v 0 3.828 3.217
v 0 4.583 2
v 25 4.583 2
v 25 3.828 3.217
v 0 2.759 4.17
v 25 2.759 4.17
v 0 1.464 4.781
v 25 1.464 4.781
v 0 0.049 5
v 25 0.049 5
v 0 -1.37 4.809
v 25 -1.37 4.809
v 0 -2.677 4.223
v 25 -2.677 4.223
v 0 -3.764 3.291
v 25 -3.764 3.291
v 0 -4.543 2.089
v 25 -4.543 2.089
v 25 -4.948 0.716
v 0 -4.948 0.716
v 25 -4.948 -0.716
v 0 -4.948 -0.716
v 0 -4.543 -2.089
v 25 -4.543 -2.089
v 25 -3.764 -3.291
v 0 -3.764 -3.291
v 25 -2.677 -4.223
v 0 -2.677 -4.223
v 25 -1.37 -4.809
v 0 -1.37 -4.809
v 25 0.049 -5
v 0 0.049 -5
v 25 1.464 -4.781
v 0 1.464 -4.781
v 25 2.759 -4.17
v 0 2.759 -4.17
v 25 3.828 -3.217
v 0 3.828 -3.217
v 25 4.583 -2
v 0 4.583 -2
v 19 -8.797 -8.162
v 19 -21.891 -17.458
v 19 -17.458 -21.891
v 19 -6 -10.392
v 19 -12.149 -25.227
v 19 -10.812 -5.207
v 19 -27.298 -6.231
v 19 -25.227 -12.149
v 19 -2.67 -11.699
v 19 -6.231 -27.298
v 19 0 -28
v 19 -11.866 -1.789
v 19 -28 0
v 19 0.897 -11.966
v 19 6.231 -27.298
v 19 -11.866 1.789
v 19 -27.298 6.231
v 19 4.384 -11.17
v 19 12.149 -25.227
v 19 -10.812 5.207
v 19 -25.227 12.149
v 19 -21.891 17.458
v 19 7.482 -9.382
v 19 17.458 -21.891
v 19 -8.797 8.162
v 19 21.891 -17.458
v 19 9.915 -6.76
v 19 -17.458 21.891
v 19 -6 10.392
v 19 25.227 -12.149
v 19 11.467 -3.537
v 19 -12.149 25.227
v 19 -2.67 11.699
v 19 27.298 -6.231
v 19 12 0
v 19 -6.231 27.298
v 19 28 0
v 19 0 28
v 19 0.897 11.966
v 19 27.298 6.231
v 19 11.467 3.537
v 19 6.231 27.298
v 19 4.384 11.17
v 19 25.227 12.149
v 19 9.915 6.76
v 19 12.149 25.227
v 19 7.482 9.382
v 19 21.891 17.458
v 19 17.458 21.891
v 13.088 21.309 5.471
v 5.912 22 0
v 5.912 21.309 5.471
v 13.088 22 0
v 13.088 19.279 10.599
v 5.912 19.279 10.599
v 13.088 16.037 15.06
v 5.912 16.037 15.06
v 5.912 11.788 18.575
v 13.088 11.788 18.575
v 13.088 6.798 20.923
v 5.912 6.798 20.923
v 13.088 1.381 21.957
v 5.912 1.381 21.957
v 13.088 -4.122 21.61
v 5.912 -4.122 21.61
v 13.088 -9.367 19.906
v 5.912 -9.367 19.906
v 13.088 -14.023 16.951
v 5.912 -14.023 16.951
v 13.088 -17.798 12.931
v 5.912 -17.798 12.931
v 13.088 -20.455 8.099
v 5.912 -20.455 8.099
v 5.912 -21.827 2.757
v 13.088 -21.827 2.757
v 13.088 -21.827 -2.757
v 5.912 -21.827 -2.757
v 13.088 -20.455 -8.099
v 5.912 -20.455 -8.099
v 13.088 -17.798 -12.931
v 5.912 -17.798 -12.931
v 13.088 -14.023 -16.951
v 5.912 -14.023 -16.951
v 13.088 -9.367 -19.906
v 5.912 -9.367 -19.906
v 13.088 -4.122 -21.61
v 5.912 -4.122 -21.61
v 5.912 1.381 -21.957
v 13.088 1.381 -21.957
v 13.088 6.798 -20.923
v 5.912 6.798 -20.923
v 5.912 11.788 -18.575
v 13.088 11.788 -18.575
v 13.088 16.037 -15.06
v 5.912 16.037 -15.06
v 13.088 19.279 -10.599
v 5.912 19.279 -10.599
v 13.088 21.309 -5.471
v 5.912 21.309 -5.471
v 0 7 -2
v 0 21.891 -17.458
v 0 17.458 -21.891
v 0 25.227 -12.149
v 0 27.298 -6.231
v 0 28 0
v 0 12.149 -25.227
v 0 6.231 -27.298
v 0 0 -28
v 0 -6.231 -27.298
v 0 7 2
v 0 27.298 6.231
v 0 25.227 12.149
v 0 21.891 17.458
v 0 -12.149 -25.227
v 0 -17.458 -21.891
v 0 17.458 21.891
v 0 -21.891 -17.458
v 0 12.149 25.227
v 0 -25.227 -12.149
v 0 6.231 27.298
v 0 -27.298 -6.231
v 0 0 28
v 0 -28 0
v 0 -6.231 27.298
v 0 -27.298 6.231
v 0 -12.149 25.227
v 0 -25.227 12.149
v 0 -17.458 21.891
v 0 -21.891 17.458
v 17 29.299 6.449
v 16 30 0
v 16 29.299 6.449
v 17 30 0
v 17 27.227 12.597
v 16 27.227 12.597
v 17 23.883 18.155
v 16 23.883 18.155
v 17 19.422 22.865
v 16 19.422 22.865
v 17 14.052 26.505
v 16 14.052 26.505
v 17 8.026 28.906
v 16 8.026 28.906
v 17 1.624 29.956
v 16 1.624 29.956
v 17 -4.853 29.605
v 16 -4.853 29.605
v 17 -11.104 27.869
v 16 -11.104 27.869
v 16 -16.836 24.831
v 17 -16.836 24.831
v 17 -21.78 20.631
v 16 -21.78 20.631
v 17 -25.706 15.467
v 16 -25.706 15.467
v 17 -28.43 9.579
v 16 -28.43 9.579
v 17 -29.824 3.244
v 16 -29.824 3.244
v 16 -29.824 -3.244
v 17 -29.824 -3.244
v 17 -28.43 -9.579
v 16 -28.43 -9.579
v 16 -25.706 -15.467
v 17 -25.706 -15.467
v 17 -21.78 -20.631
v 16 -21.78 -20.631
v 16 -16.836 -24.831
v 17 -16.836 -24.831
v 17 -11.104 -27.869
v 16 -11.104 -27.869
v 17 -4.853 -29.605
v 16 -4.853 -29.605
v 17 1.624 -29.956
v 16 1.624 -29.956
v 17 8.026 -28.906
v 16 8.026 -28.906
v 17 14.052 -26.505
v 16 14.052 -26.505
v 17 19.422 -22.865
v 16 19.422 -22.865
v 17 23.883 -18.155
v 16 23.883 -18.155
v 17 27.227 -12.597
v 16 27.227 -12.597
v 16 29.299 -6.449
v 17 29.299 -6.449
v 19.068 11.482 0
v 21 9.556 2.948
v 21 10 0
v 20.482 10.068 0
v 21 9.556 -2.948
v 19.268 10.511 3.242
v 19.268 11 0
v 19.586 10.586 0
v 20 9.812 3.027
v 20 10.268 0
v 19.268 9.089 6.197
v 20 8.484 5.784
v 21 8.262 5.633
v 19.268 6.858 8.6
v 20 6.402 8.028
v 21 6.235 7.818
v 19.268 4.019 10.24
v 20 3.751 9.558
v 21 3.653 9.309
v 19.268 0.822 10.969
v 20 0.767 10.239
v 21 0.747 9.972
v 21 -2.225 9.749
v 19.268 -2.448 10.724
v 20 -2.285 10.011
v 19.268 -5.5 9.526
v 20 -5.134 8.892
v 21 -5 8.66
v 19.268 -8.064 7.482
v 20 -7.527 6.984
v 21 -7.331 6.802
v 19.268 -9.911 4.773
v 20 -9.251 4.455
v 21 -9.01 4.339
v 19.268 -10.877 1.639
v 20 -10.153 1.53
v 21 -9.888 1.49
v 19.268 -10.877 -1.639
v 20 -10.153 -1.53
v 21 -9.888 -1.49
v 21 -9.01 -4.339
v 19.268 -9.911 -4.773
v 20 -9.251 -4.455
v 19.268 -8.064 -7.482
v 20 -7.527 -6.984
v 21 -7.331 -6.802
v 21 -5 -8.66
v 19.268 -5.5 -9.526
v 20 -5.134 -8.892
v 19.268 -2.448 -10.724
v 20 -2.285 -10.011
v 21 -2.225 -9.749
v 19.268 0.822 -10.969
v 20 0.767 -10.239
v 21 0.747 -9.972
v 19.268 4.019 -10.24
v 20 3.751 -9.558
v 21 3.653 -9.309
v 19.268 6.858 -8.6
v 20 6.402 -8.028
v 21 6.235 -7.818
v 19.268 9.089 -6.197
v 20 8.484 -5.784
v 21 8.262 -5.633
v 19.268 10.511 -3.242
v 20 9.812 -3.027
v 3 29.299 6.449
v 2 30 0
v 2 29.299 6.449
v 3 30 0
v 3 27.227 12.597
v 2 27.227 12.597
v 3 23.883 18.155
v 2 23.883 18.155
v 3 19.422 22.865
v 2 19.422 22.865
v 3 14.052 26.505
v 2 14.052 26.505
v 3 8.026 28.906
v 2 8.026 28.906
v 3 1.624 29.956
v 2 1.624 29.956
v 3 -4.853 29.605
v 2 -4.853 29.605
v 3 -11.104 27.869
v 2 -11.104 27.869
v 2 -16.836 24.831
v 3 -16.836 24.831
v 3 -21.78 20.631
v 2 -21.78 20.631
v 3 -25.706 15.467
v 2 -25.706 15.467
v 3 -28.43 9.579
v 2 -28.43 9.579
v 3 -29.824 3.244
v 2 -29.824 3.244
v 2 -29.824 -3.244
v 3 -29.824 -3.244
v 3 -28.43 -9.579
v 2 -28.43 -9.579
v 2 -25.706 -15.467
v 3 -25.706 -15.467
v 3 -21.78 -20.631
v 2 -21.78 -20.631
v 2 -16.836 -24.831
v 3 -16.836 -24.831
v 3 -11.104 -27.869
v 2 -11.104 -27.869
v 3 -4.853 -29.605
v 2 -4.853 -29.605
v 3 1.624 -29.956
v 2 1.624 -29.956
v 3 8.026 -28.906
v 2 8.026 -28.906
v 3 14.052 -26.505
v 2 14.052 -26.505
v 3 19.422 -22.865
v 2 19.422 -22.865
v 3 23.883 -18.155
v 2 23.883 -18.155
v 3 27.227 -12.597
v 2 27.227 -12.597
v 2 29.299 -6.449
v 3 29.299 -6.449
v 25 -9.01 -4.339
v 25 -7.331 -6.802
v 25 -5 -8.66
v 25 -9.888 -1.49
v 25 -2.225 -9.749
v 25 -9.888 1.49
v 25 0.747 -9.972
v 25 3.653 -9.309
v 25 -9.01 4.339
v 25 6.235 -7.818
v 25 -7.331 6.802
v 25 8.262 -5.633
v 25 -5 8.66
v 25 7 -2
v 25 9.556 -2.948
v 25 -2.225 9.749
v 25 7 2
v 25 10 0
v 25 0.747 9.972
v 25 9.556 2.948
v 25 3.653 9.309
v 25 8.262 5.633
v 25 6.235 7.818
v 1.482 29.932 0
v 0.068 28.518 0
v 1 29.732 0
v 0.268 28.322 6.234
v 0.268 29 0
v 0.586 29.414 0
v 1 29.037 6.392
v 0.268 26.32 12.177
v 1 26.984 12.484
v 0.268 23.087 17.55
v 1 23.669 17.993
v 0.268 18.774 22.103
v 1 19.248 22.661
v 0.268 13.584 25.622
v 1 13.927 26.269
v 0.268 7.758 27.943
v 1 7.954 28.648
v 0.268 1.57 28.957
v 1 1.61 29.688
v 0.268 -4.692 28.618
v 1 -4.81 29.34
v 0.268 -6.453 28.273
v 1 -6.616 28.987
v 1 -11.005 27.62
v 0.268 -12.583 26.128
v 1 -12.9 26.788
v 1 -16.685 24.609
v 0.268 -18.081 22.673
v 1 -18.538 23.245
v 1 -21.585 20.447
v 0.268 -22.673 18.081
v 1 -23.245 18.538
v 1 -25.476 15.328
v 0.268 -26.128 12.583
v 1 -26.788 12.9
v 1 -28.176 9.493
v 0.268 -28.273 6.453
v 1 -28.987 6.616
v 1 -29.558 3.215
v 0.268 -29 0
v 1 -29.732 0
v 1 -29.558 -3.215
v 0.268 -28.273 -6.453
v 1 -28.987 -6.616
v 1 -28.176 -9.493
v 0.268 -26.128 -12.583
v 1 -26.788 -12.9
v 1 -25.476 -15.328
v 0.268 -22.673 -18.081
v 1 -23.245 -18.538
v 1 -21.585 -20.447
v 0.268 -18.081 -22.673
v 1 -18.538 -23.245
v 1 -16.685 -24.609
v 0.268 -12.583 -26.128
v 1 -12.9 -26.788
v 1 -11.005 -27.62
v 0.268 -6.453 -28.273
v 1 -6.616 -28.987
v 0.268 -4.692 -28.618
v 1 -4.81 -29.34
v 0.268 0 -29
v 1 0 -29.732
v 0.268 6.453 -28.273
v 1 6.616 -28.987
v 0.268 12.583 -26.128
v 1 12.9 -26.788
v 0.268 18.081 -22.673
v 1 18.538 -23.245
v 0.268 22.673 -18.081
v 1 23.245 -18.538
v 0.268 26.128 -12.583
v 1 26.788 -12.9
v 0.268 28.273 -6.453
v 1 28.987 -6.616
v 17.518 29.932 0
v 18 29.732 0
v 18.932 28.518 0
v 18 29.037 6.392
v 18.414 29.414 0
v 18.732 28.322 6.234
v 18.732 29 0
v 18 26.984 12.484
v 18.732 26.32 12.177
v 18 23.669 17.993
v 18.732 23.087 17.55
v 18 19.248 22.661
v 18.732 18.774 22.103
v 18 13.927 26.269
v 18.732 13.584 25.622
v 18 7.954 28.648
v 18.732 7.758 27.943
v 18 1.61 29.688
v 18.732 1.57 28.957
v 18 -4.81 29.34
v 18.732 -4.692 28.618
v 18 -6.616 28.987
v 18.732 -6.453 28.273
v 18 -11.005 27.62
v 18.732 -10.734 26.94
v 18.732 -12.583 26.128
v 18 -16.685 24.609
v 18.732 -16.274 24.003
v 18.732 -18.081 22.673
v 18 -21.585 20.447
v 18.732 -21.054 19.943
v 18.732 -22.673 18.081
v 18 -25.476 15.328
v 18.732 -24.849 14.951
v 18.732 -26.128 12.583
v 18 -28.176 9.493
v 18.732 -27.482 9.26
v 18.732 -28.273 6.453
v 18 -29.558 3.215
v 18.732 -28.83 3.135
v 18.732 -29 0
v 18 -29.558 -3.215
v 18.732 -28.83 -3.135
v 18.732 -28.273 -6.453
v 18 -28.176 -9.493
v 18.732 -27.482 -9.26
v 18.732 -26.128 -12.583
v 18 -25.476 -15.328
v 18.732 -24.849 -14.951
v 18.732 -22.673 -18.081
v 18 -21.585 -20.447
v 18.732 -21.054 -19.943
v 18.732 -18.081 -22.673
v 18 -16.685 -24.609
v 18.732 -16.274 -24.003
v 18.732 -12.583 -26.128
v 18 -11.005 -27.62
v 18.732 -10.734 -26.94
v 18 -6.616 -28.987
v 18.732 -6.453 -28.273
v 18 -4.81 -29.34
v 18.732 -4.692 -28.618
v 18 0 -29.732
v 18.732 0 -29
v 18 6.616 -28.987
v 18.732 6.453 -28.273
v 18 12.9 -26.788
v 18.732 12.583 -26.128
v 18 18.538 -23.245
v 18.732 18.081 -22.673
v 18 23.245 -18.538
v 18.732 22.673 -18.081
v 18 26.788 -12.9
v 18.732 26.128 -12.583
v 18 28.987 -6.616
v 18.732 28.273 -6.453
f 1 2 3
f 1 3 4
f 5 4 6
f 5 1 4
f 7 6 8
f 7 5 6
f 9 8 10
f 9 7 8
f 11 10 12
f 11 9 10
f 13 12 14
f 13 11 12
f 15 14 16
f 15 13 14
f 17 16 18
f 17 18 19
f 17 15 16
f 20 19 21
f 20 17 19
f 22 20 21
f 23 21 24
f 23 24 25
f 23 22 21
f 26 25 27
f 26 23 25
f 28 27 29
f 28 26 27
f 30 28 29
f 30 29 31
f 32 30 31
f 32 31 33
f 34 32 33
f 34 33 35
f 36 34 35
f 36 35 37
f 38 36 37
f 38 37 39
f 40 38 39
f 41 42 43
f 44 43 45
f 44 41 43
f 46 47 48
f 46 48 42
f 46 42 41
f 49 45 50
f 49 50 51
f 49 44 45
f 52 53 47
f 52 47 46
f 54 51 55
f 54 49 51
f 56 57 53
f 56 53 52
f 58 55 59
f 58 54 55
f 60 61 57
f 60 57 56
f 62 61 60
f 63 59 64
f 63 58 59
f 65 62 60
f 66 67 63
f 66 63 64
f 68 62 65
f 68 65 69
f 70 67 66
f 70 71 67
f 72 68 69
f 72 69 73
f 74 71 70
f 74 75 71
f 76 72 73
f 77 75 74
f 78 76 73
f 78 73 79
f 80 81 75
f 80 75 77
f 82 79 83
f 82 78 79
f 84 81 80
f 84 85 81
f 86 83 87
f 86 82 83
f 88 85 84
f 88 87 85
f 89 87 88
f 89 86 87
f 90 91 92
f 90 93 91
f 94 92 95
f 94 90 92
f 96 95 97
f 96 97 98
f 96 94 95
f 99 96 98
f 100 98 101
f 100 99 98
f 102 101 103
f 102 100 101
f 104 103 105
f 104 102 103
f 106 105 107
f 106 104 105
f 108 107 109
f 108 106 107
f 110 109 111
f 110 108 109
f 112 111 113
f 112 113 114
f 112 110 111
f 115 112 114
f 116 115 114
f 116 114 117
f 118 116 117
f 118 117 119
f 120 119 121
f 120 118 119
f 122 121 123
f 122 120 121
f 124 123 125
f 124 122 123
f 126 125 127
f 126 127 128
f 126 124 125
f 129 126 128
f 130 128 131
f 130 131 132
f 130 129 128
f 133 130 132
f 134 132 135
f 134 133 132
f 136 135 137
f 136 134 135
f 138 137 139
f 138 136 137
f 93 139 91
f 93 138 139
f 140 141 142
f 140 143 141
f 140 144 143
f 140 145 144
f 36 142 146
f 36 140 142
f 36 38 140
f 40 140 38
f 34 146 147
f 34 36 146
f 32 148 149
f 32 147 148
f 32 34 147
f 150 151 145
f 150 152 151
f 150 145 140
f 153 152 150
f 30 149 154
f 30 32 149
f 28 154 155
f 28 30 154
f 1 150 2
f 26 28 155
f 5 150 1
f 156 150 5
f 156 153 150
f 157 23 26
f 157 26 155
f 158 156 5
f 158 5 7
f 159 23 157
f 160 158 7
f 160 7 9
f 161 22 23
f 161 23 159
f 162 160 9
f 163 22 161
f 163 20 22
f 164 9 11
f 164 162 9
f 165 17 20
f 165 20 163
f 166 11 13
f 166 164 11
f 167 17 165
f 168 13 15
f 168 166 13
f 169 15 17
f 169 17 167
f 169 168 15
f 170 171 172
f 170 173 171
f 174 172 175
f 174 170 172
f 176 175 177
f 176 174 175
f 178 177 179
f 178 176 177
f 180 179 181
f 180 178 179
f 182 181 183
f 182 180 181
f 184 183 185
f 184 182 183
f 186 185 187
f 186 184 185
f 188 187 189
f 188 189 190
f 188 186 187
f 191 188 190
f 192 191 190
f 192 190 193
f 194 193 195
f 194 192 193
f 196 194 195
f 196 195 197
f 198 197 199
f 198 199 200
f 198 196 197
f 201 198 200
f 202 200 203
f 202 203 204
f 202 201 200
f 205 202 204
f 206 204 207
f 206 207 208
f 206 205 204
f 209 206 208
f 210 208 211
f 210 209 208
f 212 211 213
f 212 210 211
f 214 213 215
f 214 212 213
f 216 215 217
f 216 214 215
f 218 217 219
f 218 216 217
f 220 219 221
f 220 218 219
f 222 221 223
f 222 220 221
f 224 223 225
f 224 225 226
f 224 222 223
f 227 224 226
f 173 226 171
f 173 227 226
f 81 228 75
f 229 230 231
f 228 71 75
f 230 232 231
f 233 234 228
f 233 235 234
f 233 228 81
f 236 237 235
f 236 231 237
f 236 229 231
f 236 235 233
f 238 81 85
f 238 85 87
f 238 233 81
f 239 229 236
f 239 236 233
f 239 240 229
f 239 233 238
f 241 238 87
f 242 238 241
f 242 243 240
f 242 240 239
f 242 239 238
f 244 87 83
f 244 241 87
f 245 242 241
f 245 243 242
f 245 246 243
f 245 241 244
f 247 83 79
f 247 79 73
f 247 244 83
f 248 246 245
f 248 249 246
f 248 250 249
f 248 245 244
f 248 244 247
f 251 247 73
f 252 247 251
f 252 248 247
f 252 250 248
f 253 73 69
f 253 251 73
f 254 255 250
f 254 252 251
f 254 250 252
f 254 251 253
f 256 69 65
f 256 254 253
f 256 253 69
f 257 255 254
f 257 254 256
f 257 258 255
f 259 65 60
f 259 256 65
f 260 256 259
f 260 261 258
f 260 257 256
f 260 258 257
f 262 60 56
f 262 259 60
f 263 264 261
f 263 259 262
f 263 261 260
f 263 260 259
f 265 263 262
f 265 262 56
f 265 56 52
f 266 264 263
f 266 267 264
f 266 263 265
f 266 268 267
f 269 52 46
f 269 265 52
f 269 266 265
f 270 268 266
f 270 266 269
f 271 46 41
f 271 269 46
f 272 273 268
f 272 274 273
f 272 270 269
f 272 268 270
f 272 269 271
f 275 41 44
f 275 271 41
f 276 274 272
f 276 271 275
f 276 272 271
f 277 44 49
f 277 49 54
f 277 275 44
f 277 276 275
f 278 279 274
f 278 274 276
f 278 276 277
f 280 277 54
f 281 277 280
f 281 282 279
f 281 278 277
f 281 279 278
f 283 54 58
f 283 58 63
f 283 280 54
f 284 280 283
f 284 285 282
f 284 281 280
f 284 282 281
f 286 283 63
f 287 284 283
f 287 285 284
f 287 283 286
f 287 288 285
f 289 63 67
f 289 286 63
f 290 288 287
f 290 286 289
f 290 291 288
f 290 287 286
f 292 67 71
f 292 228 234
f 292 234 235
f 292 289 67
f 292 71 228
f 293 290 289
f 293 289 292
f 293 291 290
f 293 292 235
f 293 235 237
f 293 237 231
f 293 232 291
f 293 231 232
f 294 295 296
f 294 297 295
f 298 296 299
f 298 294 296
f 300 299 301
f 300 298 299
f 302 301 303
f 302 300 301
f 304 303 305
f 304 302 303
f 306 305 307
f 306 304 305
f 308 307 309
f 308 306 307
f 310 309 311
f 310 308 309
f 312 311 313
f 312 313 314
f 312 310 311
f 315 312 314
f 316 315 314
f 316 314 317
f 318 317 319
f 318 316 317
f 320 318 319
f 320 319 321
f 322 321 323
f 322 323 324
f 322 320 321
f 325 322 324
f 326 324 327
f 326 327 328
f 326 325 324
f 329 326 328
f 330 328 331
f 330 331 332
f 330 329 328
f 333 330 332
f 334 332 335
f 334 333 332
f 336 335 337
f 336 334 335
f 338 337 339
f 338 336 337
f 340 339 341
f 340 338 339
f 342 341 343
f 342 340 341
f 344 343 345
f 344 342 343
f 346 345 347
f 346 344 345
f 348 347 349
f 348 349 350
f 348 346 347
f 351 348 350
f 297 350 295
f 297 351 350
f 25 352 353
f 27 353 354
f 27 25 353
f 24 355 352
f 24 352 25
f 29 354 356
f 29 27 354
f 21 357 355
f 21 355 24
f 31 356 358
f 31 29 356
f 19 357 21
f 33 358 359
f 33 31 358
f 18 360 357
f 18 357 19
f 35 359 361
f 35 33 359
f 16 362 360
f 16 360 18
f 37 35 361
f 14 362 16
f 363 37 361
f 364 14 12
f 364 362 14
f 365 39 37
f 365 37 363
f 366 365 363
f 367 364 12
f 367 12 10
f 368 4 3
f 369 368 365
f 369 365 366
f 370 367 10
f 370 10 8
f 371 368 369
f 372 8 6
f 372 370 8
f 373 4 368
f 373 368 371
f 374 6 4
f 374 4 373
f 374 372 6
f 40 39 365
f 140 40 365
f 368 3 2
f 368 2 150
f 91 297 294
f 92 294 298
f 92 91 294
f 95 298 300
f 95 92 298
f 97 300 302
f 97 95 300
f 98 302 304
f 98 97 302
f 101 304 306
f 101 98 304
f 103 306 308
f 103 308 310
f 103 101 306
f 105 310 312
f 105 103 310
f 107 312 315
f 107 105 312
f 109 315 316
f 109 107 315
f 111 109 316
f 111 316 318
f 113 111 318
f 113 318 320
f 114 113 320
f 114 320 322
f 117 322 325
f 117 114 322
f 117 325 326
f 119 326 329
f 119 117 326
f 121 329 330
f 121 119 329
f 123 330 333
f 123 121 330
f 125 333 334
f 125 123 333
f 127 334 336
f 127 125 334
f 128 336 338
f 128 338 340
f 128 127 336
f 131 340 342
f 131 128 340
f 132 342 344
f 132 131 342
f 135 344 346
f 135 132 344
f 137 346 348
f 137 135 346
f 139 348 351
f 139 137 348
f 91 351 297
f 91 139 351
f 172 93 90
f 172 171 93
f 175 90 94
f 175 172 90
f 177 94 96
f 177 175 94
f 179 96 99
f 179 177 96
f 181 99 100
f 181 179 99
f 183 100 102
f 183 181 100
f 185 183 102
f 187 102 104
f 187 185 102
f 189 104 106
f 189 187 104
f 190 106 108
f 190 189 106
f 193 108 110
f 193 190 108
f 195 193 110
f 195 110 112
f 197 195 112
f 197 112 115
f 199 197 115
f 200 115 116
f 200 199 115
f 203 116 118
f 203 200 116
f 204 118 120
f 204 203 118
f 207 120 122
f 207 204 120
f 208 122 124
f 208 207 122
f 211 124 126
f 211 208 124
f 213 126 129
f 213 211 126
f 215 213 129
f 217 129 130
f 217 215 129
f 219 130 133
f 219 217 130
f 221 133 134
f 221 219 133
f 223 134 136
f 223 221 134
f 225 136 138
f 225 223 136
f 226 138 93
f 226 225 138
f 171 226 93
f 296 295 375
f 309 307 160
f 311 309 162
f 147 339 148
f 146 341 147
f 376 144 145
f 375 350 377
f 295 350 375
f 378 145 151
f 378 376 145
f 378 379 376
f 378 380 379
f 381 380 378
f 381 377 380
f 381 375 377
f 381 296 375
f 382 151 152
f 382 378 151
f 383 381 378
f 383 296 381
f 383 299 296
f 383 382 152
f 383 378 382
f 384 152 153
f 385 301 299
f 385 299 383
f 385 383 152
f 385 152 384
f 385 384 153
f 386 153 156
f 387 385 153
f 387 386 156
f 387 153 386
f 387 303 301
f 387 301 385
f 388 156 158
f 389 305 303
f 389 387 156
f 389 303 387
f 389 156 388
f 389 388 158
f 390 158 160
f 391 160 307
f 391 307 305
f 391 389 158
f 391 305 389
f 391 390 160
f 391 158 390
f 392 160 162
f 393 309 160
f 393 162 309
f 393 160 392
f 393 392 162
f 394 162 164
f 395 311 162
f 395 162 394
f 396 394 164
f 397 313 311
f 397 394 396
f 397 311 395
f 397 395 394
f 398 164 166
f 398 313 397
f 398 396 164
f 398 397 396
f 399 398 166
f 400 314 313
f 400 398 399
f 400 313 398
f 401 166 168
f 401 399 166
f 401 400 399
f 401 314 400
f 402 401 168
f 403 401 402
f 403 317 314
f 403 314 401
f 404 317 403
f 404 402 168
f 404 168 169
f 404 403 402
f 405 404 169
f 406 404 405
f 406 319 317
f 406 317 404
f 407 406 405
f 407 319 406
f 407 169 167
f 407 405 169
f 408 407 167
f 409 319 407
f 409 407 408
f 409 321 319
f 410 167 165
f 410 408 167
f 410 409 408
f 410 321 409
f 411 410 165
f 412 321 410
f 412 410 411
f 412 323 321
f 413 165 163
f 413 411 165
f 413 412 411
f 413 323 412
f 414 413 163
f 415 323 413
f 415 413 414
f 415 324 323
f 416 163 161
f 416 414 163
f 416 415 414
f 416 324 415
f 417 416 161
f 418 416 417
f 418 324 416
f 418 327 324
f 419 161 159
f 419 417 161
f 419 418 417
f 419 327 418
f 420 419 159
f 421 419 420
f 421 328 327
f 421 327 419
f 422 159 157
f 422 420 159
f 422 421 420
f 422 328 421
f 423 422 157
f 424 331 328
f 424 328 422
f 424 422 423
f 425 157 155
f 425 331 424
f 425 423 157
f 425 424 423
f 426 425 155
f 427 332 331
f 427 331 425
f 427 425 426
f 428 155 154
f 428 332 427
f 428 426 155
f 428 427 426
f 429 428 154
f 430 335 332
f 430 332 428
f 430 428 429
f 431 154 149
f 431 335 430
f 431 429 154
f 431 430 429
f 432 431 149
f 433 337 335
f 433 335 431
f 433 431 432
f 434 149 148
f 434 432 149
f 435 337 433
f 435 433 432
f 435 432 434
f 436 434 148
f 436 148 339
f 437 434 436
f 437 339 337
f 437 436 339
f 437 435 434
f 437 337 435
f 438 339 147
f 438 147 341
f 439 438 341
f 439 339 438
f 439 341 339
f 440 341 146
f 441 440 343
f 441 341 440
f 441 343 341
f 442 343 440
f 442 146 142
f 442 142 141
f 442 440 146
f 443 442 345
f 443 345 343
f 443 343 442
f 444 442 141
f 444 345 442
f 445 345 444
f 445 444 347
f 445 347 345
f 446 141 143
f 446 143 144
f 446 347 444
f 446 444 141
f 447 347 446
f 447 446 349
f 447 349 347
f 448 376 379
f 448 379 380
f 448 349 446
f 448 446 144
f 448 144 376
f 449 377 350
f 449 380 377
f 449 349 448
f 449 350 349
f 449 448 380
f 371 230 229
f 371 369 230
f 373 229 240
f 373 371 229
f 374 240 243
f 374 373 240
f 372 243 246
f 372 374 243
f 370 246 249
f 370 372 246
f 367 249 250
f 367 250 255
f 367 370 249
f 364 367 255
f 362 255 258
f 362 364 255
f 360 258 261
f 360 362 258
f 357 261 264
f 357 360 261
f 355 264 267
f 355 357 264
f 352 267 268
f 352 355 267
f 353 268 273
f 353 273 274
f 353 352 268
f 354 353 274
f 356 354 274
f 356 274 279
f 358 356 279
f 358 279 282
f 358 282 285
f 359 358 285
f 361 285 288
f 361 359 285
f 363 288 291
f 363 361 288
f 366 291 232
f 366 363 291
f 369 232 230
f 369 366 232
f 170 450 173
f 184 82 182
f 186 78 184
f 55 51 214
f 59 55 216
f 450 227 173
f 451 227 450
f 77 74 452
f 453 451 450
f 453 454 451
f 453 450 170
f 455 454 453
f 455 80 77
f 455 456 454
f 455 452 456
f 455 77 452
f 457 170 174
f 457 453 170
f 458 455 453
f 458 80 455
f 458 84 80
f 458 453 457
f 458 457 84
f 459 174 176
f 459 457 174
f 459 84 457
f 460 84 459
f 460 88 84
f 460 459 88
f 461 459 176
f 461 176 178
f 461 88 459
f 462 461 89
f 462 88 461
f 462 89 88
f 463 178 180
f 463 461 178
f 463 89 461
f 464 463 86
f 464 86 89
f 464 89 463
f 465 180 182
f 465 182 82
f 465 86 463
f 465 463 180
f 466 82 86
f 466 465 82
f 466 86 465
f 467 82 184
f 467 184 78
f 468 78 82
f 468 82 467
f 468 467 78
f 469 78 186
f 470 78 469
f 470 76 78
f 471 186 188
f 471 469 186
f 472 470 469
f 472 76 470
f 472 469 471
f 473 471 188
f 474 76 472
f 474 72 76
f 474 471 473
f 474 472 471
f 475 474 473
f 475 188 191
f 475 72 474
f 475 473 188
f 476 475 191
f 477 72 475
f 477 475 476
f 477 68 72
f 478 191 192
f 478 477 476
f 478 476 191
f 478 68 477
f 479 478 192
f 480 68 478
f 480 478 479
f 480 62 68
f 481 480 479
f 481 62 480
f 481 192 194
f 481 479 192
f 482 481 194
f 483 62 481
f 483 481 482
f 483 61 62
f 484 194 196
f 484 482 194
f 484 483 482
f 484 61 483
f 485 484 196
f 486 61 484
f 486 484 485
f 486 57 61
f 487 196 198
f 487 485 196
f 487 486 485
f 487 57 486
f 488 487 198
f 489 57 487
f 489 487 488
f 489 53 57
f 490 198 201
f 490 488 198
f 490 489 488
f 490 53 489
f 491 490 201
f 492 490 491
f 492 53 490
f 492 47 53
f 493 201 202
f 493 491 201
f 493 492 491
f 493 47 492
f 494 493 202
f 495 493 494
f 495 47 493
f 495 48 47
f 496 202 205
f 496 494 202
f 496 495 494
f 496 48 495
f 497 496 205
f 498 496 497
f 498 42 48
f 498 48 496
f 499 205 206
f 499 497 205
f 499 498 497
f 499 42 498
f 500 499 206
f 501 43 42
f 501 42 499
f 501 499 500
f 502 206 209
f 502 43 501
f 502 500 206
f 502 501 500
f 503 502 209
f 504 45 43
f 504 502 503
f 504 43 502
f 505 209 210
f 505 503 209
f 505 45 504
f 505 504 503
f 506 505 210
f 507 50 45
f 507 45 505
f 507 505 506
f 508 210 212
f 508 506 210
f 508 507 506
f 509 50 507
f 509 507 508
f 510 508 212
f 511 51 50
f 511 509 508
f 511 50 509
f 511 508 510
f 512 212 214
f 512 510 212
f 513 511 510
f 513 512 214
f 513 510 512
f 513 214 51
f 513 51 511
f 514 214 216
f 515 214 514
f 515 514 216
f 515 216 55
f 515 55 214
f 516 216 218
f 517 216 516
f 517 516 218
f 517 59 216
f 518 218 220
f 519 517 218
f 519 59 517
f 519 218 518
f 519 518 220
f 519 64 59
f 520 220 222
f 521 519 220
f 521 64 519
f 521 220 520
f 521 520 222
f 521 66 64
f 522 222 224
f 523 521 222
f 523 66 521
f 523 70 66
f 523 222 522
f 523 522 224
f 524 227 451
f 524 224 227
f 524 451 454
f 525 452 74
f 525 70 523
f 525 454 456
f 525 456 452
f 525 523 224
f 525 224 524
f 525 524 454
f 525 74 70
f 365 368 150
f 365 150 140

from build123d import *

# Parameters (mm, degrees)
SKETCH2_W          = 4
SKETCH2_H          = 7
CUT_EXTRUDE1_DEPTH = 40


with BuildPart() as part:
    # Sketch1 → Revolve1 (revolve)
    with BuildSketch(Plane.XY):
        with BuildLine():
            Line((16, 30), (17, 30))
            ThreePointArc((17, 30), (18.414213562, 29.414213562), (19, 28))
            Line((19, 28), (19, 12))
            ThreePointArc((19, 12), (19.585786438, 10.585786438), (21, 10))
            Line((21, 10), (25, 10))
            Line((25, 10), (25, 5))
            Line((25, 5), (0, 5))
            Line((0, 5), (0, 28))
            ThreePointArc((0, 28), (0.585786438, 29.414213562), (2, 30))
            Line((2, 30), (3, 30))
            Line((3, 30), (5.911761874, 22))
            Line((5.911761874, 22), (13.088238126, 22))
            Line((13.088238126, 22), (16, 30))
        make_face()
    revolve(axis=Axis((-3.782421274, 0, 0), (1, 0, 0)))

    # Sketch2 → Cut-Extrude1 (cut)
    with BuildSketch(Plane(origin=(25, 0, 0), x_dir=(0, 0, -1), z_dir=(1, 0, 0))):
        with Locations((0, 3.5)):
            Rectangle(SKETCH2_W, SKETCH2_H)
    extrude(amount=-CUT_EXTRUDE1_DEPTH, mode=Mode.SUBTRACT)


solid = part.part
